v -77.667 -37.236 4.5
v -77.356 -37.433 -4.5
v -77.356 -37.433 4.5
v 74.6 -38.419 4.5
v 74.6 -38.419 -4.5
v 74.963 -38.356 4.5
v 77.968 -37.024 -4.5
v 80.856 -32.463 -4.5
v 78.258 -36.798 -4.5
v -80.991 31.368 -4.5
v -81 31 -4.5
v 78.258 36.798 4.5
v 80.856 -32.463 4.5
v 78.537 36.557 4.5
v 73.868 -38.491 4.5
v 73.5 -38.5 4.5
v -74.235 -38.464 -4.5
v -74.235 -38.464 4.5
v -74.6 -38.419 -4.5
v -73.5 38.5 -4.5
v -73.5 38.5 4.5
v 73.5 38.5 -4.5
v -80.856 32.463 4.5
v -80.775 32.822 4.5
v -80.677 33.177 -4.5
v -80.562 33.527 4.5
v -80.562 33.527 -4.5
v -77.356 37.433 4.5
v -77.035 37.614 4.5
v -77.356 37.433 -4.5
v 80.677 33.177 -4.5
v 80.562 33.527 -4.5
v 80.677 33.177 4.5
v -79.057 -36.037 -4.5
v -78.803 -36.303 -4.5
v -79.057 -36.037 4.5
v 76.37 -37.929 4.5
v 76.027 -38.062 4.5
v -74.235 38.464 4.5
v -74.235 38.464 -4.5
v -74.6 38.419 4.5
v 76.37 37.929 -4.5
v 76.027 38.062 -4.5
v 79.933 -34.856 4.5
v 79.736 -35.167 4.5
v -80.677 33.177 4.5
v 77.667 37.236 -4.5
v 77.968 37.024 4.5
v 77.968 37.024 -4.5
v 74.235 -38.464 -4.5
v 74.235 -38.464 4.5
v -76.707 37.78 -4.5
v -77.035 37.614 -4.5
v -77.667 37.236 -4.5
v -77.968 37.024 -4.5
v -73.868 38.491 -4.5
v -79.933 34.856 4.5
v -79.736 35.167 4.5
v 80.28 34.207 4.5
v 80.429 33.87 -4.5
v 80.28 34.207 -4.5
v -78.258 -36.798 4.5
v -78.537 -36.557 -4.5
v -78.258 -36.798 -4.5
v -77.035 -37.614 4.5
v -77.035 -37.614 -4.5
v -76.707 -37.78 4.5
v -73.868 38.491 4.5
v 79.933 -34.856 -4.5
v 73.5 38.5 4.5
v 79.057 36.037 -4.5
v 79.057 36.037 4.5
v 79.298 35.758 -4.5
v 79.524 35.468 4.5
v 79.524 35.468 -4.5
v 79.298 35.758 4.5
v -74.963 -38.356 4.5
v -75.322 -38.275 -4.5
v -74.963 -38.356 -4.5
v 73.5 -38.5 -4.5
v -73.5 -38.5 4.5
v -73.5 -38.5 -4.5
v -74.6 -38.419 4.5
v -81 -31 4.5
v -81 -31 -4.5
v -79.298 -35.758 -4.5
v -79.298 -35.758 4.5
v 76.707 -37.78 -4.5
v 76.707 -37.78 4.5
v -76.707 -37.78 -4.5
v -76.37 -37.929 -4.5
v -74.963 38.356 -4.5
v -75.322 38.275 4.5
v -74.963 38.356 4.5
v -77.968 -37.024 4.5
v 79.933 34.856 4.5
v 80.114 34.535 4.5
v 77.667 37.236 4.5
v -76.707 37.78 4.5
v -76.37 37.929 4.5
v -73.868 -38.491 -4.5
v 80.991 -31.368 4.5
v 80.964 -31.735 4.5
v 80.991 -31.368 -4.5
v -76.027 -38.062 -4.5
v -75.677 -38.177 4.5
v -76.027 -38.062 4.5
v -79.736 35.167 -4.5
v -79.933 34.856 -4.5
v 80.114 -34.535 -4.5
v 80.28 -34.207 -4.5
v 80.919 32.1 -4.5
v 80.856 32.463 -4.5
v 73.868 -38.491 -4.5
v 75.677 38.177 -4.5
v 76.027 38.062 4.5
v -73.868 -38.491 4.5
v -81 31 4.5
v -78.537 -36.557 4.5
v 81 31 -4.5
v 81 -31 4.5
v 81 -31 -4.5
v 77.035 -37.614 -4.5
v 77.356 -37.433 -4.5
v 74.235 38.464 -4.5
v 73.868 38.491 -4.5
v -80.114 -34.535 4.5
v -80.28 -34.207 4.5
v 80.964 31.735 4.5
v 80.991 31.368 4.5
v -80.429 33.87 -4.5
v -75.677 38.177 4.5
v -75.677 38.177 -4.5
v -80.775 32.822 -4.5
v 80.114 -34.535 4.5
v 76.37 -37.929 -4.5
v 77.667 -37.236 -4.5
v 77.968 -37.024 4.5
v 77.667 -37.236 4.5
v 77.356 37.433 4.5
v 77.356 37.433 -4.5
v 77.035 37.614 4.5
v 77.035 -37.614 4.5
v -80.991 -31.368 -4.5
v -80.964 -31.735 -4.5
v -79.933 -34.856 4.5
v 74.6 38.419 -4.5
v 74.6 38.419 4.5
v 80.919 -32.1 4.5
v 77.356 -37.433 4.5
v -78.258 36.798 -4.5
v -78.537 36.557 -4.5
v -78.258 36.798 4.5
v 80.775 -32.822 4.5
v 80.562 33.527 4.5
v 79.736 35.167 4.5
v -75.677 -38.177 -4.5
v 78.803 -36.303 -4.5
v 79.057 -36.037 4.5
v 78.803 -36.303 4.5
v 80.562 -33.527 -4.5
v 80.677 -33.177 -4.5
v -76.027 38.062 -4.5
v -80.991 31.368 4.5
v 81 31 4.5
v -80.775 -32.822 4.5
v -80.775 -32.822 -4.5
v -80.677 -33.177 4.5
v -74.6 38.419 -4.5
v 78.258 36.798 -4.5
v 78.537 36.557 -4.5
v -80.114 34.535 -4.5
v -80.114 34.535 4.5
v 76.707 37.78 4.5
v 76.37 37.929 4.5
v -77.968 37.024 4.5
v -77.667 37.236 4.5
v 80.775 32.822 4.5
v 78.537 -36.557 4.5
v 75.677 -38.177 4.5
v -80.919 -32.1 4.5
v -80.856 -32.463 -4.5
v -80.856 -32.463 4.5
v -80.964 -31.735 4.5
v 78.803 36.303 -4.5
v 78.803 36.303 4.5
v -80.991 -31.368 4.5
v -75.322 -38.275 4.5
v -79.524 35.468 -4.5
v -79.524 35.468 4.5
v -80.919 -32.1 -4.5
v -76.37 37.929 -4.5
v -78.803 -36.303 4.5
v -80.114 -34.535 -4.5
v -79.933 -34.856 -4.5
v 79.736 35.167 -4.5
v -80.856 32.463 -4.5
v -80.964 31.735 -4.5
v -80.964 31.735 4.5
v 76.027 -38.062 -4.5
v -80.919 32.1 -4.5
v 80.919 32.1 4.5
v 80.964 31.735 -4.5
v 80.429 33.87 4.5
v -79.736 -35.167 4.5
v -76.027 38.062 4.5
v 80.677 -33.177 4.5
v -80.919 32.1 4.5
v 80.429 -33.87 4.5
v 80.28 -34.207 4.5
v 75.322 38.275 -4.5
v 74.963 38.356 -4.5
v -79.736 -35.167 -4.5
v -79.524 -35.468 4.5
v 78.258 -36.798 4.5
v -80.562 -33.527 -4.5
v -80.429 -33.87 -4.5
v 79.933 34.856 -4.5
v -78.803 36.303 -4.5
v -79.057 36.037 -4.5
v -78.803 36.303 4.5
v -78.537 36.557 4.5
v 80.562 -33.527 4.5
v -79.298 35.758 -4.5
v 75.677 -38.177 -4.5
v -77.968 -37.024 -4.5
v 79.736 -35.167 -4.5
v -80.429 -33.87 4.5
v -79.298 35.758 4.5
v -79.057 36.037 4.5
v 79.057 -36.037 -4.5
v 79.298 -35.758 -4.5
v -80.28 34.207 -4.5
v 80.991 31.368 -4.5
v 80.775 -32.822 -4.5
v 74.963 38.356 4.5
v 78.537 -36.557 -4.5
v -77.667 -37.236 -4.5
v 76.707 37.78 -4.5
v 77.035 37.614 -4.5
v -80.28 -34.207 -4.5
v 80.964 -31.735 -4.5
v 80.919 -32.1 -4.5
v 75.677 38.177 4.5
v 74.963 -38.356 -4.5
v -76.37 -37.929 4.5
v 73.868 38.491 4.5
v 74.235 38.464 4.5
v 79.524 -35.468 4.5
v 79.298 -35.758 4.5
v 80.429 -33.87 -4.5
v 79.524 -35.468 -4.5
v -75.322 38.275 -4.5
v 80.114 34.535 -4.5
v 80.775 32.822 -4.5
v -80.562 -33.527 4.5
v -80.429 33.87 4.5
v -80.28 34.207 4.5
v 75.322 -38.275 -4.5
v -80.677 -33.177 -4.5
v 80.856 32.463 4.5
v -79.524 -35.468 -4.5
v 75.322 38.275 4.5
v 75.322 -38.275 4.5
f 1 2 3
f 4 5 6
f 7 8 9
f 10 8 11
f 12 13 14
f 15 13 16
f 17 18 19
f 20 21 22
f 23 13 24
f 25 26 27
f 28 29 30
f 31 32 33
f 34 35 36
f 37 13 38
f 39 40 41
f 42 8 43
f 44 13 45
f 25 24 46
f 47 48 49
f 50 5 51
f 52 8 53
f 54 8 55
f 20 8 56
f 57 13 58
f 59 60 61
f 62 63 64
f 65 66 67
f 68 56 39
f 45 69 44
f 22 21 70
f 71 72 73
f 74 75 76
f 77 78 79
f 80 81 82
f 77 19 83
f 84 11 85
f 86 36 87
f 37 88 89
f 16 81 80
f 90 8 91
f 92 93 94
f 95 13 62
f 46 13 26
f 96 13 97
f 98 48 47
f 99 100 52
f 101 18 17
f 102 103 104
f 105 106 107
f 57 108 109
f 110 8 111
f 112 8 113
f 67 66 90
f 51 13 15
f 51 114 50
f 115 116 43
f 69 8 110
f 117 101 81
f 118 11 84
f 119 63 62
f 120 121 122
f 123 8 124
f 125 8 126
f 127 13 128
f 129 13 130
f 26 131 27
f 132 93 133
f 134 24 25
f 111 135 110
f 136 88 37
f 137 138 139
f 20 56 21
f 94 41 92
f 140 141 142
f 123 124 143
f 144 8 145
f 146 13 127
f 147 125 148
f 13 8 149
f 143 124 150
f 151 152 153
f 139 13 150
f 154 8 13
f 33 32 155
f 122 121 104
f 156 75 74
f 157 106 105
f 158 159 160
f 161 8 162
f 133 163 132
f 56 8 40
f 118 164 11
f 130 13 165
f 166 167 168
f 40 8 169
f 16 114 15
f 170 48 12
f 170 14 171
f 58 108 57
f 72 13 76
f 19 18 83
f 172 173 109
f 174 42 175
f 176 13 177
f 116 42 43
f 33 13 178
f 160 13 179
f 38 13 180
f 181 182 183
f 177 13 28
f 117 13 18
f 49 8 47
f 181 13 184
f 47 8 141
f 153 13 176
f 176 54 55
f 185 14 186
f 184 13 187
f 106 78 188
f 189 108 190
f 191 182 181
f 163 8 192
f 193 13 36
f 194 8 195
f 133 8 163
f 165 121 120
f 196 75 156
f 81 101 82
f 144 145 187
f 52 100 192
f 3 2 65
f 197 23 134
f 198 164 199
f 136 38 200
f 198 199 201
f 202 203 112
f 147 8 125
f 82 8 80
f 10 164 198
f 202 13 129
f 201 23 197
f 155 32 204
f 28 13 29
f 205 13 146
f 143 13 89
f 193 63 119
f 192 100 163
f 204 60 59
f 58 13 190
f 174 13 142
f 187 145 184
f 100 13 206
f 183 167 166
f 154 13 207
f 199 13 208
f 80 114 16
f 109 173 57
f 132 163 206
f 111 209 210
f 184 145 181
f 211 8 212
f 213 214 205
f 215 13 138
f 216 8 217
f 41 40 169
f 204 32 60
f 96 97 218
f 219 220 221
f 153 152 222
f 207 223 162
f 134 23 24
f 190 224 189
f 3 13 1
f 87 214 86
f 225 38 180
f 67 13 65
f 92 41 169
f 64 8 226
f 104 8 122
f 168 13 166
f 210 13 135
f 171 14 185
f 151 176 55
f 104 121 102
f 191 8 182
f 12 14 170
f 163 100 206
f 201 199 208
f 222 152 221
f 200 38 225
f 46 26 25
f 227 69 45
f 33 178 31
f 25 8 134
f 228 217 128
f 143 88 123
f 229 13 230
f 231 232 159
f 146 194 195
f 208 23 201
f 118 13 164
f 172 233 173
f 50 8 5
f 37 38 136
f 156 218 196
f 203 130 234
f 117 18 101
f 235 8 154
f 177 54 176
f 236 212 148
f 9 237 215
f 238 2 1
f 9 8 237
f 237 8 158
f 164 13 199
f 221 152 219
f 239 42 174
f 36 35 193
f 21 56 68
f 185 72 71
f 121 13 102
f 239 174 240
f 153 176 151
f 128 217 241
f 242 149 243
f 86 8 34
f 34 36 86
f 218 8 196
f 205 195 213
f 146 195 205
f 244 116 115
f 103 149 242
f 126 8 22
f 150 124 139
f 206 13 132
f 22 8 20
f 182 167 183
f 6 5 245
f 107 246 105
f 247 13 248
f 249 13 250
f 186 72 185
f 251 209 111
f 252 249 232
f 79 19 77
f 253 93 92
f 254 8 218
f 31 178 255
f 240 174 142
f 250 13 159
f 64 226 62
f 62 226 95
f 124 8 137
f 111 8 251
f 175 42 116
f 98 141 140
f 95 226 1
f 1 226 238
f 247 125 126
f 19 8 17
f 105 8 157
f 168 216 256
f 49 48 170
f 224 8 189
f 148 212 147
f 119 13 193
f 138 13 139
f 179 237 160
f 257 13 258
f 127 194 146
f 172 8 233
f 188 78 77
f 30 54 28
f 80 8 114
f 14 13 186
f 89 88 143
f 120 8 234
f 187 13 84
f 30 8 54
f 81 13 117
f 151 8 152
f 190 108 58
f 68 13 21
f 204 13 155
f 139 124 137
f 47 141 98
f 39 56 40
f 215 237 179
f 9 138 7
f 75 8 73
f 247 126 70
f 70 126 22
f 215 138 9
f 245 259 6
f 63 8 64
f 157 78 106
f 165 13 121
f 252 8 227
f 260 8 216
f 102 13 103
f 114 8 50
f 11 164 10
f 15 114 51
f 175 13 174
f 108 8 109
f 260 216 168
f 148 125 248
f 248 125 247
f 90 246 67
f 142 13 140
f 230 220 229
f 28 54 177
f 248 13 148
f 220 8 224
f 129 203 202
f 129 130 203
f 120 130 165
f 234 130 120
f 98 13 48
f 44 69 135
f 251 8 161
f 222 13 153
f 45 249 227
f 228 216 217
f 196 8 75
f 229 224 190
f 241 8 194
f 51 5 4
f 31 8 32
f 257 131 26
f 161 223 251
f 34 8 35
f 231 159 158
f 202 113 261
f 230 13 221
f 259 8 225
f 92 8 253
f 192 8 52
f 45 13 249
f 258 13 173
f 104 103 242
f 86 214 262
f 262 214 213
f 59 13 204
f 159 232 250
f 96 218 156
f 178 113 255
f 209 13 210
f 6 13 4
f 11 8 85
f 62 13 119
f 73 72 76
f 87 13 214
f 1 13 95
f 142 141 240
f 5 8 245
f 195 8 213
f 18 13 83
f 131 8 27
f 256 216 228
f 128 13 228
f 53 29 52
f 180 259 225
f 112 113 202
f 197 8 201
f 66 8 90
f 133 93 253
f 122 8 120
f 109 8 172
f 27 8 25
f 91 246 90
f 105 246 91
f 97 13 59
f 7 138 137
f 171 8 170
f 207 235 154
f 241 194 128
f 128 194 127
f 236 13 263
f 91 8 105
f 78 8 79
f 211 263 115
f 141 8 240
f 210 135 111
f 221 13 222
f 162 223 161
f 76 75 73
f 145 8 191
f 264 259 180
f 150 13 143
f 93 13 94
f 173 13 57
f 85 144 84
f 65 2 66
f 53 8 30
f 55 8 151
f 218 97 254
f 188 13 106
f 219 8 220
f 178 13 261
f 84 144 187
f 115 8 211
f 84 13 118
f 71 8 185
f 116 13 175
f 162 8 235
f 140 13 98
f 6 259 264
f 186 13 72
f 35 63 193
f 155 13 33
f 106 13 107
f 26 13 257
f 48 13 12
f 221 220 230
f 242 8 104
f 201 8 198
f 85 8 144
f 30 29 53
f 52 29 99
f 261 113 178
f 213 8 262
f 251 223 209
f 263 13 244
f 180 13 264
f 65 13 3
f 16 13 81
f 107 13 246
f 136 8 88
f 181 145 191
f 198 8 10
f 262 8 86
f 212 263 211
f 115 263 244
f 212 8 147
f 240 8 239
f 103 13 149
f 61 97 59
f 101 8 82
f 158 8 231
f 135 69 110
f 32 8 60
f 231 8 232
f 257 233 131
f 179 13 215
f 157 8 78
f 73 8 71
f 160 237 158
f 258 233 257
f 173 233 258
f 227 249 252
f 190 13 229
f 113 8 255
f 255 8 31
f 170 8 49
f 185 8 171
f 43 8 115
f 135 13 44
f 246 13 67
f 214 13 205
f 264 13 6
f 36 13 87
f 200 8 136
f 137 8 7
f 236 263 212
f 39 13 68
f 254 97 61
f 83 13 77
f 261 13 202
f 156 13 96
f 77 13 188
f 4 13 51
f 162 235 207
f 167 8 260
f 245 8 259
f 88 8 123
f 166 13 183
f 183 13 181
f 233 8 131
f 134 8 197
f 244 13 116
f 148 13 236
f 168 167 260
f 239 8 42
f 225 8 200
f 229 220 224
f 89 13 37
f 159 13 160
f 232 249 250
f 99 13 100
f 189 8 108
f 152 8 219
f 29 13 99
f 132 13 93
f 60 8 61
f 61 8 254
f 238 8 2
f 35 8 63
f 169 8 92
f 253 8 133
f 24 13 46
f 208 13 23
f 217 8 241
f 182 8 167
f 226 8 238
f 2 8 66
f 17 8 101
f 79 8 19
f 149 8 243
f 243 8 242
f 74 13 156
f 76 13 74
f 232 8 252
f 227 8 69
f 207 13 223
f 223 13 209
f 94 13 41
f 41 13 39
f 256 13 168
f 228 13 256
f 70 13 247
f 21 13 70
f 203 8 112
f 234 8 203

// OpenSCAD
$fn = 128;
r_round_corner = 15;

smartphone();

module smartphone(){
    hull(){
        cube ([162-r_round_corner/2, 77-r_round_corner/2, 9], center=true);
        
        color("red")
        translate([162/2-r_round_corner/2, 77/2-r_round_corner/2, 0])
        cylinder(d=r_round_corner, h=9, center=true);
        
        mirror ([1, 0, 0])
        color("red")
         translate([162/2-r_round_corner/2, 77/2-r_round_corner/2, 0])
        cylinder(d=r_round_corner, h=9, center=true);
        
        mirror ([0, 1, 0])
        color("red")
         translate([162/2-r_round_corner/2, 77/2-r_round_corner/2, 0])
        cylinder(d=r_round_corner, h=9, center=true);
        
        mirror ([1, 0, 0])
        mirror ([0, 1, 0])
        color("red")
         translate([162/2-r_round_corner/2, 77/2-r_round_corner/2, 0])
        cylinder(d=r_round_corner, h=9, center=true);
    }
}
